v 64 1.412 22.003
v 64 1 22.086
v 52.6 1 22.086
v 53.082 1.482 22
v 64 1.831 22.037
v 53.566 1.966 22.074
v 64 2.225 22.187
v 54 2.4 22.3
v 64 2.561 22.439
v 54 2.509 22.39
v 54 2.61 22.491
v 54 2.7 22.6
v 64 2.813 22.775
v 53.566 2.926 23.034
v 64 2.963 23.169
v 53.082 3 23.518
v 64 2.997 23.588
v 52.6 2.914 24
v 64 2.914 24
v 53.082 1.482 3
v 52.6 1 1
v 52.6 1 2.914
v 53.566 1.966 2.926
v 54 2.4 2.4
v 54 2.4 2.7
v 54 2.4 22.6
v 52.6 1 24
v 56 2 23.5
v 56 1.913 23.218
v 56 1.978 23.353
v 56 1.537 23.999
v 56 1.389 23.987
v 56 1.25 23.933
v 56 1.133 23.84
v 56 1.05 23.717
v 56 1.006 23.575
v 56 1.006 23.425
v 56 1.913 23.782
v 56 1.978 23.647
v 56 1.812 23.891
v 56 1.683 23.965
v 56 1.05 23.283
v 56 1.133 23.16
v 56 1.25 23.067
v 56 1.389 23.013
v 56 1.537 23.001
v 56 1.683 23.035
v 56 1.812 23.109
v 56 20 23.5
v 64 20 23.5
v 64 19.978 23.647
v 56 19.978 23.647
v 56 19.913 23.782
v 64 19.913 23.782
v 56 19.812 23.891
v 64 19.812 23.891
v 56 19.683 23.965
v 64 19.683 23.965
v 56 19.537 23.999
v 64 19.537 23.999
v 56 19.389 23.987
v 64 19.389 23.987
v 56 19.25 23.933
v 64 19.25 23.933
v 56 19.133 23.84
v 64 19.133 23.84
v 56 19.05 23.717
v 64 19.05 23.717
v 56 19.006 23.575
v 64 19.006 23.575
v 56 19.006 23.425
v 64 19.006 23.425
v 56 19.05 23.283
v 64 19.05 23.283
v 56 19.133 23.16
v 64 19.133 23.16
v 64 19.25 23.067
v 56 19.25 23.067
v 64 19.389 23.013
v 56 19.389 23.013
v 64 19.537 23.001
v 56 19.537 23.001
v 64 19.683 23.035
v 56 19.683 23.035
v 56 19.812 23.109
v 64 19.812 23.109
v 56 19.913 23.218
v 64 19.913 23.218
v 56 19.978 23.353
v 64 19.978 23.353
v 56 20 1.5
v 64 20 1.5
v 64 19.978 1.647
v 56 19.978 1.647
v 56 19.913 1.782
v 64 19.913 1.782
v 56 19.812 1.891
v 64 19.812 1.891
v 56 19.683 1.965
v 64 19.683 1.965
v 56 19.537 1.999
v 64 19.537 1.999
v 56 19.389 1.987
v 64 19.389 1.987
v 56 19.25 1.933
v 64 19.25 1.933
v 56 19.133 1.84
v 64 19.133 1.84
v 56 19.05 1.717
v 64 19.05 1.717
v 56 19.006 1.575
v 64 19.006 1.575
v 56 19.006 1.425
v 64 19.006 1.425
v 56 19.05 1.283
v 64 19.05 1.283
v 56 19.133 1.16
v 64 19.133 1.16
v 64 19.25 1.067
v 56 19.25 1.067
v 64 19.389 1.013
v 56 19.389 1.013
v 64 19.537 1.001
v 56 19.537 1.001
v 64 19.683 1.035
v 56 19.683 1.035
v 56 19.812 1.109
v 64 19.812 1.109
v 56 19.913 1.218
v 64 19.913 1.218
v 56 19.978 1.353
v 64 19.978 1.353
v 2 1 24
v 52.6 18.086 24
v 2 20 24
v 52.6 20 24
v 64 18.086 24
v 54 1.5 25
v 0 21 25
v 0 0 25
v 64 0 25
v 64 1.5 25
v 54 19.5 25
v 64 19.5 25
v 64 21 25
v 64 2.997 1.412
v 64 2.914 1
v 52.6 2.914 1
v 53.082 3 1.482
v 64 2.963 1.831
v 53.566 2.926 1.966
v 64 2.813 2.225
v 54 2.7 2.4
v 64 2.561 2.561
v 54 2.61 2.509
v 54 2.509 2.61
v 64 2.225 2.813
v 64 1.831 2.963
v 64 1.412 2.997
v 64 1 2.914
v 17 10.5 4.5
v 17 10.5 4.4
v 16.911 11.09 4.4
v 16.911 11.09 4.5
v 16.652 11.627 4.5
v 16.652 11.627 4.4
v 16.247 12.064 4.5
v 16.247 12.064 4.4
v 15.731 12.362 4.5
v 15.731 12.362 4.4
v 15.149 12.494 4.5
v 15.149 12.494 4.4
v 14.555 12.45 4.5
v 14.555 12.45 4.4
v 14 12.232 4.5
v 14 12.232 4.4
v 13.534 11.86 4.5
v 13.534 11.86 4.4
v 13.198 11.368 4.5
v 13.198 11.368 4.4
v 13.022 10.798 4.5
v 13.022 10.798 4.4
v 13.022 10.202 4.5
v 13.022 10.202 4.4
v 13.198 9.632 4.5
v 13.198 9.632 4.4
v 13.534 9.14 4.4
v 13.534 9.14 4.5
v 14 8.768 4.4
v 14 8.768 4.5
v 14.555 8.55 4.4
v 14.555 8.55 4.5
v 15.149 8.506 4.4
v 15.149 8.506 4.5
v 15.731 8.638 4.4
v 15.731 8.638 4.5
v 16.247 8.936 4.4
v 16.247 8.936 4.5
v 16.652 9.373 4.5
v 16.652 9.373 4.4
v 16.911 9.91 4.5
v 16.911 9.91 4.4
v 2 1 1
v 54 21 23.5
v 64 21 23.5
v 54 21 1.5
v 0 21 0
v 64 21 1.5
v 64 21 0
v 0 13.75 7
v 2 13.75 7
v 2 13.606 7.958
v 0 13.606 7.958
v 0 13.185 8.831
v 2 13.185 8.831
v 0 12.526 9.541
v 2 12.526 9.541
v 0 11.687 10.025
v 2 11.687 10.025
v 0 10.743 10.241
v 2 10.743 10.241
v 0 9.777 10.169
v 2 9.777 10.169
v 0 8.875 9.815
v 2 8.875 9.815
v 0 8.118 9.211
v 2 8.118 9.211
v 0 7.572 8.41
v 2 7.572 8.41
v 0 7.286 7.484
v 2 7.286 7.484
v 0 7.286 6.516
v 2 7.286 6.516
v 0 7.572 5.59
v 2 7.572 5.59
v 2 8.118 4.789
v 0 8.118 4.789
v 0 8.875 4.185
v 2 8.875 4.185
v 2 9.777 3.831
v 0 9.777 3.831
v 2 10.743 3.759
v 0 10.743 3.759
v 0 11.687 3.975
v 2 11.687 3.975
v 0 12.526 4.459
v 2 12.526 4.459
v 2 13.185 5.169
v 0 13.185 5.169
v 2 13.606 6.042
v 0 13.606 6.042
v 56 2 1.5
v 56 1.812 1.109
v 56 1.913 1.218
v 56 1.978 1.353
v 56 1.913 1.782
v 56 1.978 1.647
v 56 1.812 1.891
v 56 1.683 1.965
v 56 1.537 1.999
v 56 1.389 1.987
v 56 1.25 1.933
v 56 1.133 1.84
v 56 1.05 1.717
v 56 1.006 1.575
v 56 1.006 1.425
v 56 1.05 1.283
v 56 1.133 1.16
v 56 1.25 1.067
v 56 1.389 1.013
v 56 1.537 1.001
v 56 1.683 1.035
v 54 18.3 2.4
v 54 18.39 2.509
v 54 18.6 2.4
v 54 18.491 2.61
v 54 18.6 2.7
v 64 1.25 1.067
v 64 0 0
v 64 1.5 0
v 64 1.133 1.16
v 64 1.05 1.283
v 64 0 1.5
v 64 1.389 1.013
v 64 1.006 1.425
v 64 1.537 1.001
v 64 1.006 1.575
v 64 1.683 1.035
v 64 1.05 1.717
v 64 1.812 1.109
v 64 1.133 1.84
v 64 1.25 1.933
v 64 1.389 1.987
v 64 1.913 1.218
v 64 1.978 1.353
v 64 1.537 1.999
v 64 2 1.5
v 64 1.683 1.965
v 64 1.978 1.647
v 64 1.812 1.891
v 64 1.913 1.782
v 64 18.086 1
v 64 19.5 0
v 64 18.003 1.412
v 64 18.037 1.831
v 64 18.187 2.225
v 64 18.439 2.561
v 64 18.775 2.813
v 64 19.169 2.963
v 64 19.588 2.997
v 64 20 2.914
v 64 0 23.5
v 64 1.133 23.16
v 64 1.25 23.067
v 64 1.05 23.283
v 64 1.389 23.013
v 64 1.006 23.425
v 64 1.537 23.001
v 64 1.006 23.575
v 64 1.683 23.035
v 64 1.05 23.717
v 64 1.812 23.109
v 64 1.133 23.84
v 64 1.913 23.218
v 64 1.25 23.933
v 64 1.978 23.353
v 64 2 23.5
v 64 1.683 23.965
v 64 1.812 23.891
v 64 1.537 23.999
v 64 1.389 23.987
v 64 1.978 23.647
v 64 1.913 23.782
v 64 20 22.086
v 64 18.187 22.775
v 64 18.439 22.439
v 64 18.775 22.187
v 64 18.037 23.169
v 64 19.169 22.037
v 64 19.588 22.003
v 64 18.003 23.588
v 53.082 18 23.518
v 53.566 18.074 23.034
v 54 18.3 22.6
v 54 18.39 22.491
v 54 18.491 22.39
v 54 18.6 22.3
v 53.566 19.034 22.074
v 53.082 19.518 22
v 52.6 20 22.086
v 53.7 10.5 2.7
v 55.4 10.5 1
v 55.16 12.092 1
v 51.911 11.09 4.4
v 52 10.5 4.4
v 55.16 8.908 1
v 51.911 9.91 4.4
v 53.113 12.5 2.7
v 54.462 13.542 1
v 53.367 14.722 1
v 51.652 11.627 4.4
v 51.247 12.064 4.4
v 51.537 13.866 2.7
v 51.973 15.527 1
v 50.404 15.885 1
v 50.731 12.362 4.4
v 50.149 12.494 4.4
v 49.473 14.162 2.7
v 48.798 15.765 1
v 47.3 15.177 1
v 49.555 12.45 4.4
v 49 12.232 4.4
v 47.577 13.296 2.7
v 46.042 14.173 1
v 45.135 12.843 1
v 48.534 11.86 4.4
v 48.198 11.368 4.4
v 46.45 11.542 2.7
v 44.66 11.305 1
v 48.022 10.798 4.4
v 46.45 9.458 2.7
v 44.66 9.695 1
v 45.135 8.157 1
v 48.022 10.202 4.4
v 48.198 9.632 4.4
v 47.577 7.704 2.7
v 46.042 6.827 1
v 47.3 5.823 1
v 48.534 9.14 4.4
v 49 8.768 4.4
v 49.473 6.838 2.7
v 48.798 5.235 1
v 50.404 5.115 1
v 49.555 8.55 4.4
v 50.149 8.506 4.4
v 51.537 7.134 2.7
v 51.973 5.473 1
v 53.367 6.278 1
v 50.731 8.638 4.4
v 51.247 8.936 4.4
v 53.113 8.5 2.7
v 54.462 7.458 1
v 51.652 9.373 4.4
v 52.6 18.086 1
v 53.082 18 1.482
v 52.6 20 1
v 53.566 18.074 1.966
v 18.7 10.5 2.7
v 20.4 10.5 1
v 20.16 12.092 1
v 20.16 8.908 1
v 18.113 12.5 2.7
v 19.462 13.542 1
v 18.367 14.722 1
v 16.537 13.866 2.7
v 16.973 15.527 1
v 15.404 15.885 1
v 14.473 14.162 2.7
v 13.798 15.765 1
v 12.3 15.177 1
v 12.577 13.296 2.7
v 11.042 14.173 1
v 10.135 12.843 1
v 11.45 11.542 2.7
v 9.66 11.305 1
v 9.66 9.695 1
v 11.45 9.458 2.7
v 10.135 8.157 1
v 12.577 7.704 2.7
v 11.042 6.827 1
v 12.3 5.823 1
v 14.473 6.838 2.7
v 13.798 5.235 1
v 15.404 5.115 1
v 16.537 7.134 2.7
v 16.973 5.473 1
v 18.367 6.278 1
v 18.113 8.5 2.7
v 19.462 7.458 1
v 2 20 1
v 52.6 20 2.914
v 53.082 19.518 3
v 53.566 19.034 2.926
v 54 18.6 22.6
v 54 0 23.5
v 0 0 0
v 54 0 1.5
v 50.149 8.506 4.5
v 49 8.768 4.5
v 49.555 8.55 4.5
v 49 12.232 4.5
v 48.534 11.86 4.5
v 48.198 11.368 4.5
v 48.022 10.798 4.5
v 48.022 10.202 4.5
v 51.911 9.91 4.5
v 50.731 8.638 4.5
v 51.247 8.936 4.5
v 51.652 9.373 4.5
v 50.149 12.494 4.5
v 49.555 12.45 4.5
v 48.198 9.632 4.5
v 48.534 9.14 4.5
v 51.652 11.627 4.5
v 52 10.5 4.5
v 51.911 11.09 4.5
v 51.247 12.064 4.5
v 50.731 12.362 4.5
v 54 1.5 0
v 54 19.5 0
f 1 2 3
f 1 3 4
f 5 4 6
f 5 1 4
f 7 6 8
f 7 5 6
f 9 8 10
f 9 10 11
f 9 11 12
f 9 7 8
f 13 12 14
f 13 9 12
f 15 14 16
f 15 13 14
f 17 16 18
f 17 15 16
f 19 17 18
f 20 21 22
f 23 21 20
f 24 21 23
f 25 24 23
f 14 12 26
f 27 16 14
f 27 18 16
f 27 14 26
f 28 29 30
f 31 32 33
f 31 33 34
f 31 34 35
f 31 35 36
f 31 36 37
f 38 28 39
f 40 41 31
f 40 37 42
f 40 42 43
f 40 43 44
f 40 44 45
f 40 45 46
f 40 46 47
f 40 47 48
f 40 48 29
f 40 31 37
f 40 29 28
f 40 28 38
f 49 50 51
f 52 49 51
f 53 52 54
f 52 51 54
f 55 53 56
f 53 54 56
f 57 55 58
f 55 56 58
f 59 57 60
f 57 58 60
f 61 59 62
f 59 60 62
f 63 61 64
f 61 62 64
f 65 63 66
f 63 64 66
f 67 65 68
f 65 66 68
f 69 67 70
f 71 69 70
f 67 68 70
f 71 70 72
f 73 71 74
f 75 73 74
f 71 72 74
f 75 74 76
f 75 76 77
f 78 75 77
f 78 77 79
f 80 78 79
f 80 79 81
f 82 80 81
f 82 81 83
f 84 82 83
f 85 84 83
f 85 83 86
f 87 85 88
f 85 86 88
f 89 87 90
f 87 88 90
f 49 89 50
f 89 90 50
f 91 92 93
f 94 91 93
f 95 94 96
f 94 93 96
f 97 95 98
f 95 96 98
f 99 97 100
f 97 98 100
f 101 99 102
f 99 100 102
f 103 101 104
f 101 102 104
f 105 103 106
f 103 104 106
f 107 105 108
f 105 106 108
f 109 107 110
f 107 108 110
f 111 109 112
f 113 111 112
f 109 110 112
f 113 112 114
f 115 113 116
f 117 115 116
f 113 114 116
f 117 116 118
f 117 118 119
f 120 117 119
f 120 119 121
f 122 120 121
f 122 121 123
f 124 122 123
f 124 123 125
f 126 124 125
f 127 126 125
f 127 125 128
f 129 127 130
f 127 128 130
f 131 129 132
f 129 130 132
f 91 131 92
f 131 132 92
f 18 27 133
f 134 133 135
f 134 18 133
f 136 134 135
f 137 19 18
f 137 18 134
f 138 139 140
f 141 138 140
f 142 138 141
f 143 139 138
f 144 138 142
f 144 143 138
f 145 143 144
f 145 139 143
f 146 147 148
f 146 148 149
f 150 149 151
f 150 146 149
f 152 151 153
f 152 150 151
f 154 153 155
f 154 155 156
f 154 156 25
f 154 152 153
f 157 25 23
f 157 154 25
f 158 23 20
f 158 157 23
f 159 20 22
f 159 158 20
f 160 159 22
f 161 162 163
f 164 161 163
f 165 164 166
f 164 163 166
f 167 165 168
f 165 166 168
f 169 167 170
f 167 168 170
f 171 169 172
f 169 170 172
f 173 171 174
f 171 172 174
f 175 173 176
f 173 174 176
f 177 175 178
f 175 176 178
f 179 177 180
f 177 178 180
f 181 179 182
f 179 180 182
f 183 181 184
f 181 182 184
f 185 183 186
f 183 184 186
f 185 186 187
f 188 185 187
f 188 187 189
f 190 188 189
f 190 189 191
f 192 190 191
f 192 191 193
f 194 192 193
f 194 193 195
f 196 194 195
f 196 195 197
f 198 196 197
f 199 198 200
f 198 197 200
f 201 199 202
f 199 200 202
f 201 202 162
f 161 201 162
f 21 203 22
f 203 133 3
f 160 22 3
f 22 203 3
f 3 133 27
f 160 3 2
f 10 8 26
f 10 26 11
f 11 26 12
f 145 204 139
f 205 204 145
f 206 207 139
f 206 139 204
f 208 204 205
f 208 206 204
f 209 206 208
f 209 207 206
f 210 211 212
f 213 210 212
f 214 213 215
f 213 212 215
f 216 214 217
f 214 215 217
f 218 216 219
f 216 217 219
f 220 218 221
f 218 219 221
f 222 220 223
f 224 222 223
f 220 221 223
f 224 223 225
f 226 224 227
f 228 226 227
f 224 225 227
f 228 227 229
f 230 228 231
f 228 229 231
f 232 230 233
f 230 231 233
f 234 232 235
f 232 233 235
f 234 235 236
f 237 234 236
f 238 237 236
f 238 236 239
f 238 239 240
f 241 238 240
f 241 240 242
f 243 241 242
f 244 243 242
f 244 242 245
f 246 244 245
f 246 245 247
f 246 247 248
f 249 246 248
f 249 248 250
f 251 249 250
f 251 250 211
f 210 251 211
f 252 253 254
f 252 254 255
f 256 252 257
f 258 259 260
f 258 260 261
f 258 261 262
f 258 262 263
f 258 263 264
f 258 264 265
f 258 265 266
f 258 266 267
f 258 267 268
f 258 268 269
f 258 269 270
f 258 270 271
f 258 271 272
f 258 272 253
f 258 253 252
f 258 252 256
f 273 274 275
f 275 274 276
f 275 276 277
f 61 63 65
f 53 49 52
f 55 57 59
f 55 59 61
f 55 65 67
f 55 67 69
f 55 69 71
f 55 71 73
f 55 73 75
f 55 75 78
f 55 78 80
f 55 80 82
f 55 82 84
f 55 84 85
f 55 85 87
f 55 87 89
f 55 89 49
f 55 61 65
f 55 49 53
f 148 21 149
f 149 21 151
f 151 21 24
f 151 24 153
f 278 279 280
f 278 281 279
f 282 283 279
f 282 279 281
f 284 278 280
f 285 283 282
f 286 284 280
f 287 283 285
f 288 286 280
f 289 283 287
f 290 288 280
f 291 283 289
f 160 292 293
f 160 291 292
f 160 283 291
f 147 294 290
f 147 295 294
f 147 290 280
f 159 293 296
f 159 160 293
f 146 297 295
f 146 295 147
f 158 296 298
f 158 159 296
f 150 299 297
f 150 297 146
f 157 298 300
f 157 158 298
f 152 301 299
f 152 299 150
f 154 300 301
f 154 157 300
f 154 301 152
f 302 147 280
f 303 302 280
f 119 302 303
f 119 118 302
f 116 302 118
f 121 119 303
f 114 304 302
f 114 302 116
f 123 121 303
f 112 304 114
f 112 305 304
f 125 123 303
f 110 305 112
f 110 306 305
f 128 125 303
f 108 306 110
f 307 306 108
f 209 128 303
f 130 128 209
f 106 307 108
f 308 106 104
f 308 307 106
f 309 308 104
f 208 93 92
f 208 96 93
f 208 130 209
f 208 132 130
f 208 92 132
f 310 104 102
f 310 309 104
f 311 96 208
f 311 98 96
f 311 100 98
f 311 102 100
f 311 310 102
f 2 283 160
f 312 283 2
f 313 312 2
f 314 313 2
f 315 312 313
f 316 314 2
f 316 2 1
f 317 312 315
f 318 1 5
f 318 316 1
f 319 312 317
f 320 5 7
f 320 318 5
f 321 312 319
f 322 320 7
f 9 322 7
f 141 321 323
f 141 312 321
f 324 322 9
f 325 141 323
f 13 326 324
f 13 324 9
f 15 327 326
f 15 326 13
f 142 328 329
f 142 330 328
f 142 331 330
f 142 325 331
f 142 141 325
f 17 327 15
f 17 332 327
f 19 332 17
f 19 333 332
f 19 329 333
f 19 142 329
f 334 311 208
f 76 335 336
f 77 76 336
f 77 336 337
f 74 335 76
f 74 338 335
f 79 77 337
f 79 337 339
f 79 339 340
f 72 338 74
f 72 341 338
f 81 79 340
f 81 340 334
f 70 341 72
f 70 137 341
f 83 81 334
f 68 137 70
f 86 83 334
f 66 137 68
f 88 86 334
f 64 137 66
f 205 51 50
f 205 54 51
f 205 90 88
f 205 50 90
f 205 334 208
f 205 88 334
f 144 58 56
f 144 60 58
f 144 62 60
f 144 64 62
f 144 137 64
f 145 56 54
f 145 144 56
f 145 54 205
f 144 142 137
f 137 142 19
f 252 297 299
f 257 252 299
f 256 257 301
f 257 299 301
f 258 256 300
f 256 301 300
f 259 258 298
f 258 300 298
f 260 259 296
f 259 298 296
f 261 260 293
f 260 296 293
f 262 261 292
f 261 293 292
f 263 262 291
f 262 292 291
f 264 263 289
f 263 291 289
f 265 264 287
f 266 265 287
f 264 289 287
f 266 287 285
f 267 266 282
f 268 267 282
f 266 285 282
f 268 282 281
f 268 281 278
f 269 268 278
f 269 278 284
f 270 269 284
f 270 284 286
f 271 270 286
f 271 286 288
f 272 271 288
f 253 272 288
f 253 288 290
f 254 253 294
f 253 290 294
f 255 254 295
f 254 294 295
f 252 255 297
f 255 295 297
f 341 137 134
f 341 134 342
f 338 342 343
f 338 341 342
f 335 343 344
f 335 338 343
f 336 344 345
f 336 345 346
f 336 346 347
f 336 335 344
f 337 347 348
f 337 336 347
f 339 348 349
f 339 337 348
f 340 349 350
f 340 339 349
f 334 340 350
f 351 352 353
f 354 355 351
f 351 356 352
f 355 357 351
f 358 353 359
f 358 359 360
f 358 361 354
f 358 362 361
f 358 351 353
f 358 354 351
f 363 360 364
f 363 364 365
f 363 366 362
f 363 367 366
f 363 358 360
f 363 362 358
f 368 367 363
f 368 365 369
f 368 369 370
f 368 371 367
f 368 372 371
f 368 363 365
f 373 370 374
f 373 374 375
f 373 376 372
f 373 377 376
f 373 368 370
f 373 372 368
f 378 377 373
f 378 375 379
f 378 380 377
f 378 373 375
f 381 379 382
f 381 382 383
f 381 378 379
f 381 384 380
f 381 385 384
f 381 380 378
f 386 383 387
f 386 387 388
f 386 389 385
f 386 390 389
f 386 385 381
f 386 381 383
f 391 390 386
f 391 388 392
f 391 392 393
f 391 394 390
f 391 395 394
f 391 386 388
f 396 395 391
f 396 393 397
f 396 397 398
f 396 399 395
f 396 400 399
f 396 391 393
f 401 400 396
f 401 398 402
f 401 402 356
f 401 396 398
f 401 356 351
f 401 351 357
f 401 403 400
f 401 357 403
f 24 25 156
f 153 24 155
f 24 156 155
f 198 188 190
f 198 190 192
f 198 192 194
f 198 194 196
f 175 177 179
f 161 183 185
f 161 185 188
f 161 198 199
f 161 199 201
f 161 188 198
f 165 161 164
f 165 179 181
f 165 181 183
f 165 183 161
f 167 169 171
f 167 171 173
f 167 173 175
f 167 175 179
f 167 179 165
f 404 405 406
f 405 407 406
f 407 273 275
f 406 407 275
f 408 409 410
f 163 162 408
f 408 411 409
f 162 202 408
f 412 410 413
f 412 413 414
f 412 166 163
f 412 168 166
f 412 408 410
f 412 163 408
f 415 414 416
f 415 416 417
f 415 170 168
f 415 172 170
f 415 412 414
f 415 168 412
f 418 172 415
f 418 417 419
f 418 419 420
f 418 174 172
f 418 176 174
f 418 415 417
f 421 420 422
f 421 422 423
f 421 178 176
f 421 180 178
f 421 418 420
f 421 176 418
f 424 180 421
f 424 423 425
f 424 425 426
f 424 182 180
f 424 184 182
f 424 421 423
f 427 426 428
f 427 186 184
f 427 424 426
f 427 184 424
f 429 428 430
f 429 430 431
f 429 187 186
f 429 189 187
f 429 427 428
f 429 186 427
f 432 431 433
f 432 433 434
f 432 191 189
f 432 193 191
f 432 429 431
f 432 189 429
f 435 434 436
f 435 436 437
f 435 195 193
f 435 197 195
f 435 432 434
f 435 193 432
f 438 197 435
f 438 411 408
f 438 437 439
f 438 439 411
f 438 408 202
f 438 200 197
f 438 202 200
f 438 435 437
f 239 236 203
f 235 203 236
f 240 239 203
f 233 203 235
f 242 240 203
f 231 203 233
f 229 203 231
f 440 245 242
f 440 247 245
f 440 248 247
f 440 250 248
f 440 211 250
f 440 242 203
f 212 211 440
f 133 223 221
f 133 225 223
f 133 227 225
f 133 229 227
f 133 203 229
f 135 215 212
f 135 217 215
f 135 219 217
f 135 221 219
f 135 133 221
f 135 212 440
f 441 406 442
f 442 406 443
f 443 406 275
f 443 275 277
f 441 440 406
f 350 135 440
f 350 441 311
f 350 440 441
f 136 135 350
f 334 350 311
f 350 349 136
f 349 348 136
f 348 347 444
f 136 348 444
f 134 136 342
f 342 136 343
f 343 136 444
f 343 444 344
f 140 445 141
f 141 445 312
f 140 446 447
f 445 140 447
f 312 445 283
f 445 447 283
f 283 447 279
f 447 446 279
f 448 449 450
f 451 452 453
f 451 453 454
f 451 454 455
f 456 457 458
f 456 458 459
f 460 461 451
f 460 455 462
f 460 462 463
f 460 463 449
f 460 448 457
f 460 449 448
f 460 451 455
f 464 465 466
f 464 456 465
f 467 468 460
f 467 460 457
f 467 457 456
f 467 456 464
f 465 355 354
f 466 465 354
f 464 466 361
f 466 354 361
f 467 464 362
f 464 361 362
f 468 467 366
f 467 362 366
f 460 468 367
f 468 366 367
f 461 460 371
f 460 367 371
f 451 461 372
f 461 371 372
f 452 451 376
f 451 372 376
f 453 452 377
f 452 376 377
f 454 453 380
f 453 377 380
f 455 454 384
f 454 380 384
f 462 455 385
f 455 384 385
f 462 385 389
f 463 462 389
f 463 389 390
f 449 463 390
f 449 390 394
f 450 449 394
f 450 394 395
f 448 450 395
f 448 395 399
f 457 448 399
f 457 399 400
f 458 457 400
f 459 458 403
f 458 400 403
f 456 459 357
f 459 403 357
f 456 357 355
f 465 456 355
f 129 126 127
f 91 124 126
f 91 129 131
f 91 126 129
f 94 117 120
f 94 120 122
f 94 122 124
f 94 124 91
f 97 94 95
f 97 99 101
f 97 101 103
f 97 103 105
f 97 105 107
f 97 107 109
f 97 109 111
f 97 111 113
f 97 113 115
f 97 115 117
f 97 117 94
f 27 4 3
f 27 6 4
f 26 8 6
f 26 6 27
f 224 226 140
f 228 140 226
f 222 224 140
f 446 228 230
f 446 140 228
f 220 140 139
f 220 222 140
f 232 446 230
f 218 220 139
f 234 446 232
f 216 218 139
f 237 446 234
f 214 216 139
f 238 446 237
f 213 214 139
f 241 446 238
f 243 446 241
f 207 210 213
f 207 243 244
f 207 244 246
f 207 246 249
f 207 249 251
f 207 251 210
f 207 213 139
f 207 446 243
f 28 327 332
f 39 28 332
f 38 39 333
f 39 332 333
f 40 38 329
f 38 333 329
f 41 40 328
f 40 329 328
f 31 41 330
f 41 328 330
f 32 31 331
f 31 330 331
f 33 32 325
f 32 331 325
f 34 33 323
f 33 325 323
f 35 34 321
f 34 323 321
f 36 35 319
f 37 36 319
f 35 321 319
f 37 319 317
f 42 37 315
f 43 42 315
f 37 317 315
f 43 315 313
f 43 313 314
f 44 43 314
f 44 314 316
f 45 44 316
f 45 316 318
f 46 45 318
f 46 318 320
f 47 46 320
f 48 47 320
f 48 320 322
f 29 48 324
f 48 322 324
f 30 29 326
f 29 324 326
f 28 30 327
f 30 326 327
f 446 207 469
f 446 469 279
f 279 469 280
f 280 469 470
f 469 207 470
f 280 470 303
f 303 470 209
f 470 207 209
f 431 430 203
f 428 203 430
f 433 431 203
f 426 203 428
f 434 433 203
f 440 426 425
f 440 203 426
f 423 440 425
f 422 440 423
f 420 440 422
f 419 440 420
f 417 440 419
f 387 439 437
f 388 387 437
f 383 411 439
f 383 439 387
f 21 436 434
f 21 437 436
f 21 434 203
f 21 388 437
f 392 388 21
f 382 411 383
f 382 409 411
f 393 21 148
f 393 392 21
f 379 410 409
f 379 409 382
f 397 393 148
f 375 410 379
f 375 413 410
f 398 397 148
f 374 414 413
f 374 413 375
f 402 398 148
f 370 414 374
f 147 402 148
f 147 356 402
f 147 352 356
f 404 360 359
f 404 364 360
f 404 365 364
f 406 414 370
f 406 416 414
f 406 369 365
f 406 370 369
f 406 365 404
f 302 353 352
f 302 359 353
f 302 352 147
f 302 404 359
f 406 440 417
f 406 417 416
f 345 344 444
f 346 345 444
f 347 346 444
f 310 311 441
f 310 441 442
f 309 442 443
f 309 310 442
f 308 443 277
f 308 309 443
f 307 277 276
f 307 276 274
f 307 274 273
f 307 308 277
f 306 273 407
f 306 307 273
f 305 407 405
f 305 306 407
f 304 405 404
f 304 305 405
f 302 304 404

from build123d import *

# Parameters (mm, degrees)
SKETCH_W        = 64
SKETCH_H        = 21
PAD_DEPTH       = 25
SKETCH001_W     = 62
SKETCH001_H     = 19
POCKET_DEPTH    = 24
SKETCH003_R     = 3.25
POCKET001_DEPTH = 5
SKETCH004_R     = 2
PAD001_DEPTH    = 3.5
SKETCH005_W     = 20
SKETCH005_H     = 1
PAD002_DEPTH    = 63
CHAMFER_SIZE    = 3.4
SKETCH006_R     = 1.5
PAD003_DEPTH    = 10
SKETCH007_R     = 0.5
POCKET002_DEPTH = 8
CHAMFER001_SIZE = 1.4


with BuildPart() as part:
    # Sketch → Pad (new body)
    with BuildSketch(Plane.XY):
        with Locations((32, 10.5)):
            Rectangle(SKETCH_W, SKETCH_H)
    extrude(amount=PAD_DEPTH)

    # Sketch001 (on Face6 of Pad) → Pocket (cut)
    with BuildSketch(Plane.XY.offset(25)):
        with Locations((33, 10.5)):
            Rectangle(SKETCH001_W, SKETCH001_H)
    extrude(amount=-POCKET_DEPTH, mode=Mode.SUBTRACT)

    # Sketch003 (on Face10 of Pocket) → Pocket001 (cut)
    with BuildSketch(Plane.YZ.offset(2)):
        with Locations((10.5, 7)):
            Circle(SKETCH003_R)
    extrude(amount=-POCKET001_DEPTH, mode=Mode.SUBTRACT)

    # Sketch004 (on Face9 of Pocket001) → Pad001 (join)
    with BuildSketch(Plane.XY.offset(1)):
        with Locations((15, 10.5)):
            Circle(SKETCH004_R)
        with Locations((50, 10.5)):
            Circle(SKETCH004_R)
    extrude(amount=PAD001_DEPTH)

    # Sketch005 (on Face3 of Pad001) → Pad002 (join)
    with BuildSketch(Plane.YZ.offset(64)):
        with Locations((10.5, 24.5)):
            Rectangle(SKETCH005_W, SKETCH005_H)
    extrude(amount=-PAD002_DEPTH)

    # Chamfer
    chamfer_edges = [part.edges().sort_by_distance(p)[0] for p in [
        (13, 10.5, 1),
        (48, 10.5, 1),
    ]]
    chamfer(chamfer_edges, length=CHAMFER_SIZE)

    # Sketch006 (on Face5 of Chamfer) → Pad003 (join)
    with BuildSketch(Plane.YZ.offset(64)):
        with Locations((1.5, 23.5)):
            Circle(SKETCH006_R)
        with Locations((19.5, 23.5)):
            Circle(SKETCH006_R)
        with Locations((1.5, 1.5)):
            Circle(SKETCH006_R)
        with Locations((19.5, 1.5)):
            Circle(SKETCH006_R)
    extrude(amount=-PAD003_DEPTH)

    # Sketch007 → Pocket002 (cut)
    with BuildSketch(Plane.YZ.offset(64)):
        with Locations((1.5, 23.5)):
            Circle(SKETCH007_R)
        with Locations((19.5, 23.5)):
            Circle(SKETCH007_R)
        with Locations((1.5, 1.5)):
            Circle(SKETCH007_R)
        with Locations((19.5, 1.5)):
            Circle(SKETCH007_R)
    extrude(amount=-POCKET002_DEPTH, mode=Mode.SUBTRACT)

    # Chamfer001
    chamfer001_edges = [part.edges().sort_by_distance(p)[0] for p in [
        (54, 1.957107, 1),
        (54, 1, 1.957107),
        (54, 20, 1.957107),
        (54, 19.042893, 1),
        (54, 1, 23.042893),
        (54, 1.957107, 24),
        (54, 19.042893, 24),
        (54, 20, 23.042893),
    ]]
    chamfer(chamfer001_edges, length=CHAMFER001_SIZE)


solid = part.part
